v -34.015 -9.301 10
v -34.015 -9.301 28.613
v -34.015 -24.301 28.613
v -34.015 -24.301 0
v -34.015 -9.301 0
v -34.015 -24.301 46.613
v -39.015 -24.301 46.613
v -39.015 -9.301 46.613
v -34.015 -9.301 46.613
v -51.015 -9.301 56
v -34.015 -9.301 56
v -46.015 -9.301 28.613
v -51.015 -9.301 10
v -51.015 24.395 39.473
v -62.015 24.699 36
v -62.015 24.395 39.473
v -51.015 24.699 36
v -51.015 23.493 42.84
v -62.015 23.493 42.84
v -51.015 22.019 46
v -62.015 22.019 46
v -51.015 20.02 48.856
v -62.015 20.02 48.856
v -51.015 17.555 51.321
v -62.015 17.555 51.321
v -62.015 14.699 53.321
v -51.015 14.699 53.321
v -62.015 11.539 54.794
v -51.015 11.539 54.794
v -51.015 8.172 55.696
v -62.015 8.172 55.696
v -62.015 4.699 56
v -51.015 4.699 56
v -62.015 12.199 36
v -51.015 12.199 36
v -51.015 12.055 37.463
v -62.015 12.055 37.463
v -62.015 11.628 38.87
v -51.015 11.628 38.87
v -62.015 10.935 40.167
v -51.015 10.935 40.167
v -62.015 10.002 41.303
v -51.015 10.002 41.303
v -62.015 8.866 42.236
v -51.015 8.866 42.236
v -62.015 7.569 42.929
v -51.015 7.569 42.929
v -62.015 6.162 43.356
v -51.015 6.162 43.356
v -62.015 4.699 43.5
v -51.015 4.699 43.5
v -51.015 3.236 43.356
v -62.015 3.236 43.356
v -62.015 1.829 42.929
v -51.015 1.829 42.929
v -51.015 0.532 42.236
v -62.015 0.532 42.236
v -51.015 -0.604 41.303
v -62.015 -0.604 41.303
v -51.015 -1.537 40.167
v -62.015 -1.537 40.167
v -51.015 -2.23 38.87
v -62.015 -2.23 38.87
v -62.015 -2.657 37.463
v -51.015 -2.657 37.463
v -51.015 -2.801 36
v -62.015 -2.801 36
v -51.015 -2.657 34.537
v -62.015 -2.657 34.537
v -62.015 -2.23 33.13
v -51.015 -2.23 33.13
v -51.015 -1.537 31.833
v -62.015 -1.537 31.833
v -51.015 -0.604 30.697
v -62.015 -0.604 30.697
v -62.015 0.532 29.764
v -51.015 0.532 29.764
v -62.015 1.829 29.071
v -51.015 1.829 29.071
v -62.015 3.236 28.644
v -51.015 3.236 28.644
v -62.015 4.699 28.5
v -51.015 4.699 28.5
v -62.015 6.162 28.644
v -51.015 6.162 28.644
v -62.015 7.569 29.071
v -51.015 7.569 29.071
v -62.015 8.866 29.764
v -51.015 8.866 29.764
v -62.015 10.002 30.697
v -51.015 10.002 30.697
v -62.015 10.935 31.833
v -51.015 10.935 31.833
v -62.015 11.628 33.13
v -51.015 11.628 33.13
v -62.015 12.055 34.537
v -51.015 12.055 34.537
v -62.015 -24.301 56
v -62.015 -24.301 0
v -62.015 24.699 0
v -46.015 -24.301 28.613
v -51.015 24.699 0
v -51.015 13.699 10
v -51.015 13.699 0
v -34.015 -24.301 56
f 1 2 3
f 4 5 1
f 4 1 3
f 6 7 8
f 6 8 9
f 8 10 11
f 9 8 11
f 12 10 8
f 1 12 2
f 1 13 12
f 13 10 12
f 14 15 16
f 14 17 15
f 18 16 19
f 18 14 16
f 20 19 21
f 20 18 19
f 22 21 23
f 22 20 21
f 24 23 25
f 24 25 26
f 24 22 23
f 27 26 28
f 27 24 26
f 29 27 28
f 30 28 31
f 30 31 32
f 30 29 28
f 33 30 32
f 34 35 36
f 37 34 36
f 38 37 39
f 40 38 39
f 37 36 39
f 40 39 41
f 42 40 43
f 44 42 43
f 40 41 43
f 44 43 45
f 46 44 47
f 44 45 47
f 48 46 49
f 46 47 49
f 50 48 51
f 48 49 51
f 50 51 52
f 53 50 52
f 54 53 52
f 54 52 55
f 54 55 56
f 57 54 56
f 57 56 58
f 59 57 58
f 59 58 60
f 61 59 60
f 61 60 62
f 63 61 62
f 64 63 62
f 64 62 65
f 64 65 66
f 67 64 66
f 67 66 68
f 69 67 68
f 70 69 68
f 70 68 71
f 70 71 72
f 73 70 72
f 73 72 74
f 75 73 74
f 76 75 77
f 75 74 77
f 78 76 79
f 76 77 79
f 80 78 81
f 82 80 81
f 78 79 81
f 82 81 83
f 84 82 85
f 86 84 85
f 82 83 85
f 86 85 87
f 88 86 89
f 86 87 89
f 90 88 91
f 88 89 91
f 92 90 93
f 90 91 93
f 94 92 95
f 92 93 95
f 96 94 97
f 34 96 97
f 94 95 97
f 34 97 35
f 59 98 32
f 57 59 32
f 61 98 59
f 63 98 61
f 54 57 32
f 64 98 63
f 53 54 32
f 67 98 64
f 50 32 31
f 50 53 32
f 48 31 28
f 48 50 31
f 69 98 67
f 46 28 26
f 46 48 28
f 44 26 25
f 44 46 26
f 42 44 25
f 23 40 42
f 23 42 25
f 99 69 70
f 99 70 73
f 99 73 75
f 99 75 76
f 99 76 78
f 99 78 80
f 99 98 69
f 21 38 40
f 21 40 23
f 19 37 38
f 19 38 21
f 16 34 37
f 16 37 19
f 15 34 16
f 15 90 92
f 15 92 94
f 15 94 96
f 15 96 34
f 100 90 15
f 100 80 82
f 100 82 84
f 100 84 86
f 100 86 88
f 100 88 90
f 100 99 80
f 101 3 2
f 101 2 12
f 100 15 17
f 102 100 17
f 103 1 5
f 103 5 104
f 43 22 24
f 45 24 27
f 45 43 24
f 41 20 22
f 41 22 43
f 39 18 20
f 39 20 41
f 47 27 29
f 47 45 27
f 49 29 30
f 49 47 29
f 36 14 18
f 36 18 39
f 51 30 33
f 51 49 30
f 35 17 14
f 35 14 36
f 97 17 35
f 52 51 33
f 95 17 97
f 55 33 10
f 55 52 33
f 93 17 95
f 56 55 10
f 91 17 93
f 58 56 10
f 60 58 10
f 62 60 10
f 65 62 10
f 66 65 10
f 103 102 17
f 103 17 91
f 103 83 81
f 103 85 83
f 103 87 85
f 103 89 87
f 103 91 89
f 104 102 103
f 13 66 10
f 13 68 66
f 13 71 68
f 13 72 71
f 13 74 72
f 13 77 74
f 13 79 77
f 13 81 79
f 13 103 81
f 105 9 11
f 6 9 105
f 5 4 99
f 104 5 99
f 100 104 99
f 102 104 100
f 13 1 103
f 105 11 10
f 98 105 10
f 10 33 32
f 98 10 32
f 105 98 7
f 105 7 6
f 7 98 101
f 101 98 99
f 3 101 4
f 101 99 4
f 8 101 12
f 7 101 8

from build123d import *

# Parameters (mm, degrees)
Y_KSEKLIK_EKSTR_ZYON1_DEPTH = 56
RADYUS1_R                   = 20
KES_EKSTR_ZYON1_REACH       = 65.522
IZIM2_R                     = 7.5
KES_EKSTR_ZYON2_DEPTH       = 91.210054598
KES_EKSTR_ZYON2_DEPTH_BACK  = 91.210054598
FEDER1_REACH                = 89.131
IZIM4_WALL_W                = 204.86364479
IZIM4_WALL_H                = 10


with BuildPart() as part:
    # Çizim1 → Yükseklik-Ekstrüzyon1 (new body)
    with BuildSketch(Plane.XY):
        Polygon((-62.014949412, 24.698979592), (-51.014949412, 24.698979592), (-51.014949412, -9.301020408), (-34.014949412, -9.301020408), (-34.014949412, -24.301020408), (-51.014949412, -24.301020408), (-62.014949412, -24.301020408), align=None)
    extrude(amount=Y_KSEKLIK_EKSTR_ZYON1_DEPTH)

    # Radyus1
    radyus1_edges = [part.edges().sort_by_distance(p)[0] for p in [
        (-56.514949412, 24.698979592, 56),
    ]]
    fillet(radyus1_edges, radius=RADYUS1_R)

    # Çizim2 → Kes-Ekstrüzyon1 (cut, up to next)
    with BuildSketch(Plane(origin=(-51.014949412, 0, 0), x_dir=(0, 0, -1), z_dir=(1, 0, 0)), mode=Mode.PRIVATE) as kes_ekstr_zyon1_sk1:
        with Locations(Location((-36, 4.698979592, 0), (0, 0, 90))):
            Circle(IZIM2_R)
    kes_ekstr_zyon1_tool1 = extrude(kes_ekstr_zyon1_sk1.sketch, amount=-KES_EKSTR_ZYON1_REACH, mode=Mode.PRIVATE) & part.part
    add(kes_ekstr_zyon1_tool1.solids().sort_by_distance((-51.014949, 4.69898, 36))[0], mode=Mode.SUBTRACT)

    # Çizim3 → Kes-Ekstrüzyon2 (cut, two sides: drawn at the far end of the back side and taken through both)
    with BuildSketch(Plane(origin=(0, -9.301020408, 0), x_dir=(1, 0, 0), z_dir=(0, 1, 0)).offset(-KES_EKSTR_ZYON2_DEPTH_BACK)):
        Polygon((84.737919905, -28.613266847), (-34.014949412, -28.613266847), (-46.014949412, -28.613266847), (-39.014949412, -46.613266847), (-34.014949412, -46.613266847), (84.737919905, -46.613266847), (322.24365854, -46.613266847), (322.24365854, -28.613266847), align=None)
    extrude(amount=KES_EKSTR_ZYON2_DEPTH + KES_EKSTR_ZYON2_DEPTH_BACK, mode=Mode.SUBTRACT)

    # Çizim4 wall → Feder1 (add, up to next)
    with BuildSketch(Plane(origin=(-42.514949412, 2.198979592, 0), x_dir=(-0.594391061084, 0.804176141466, 0), z_dir=(0.804176141466, 0.594391061084, 0)), mode=Mode.PRIVATE) as feder1_sk1:
        with Locations((0, 5)):
            Rectangle(IZIM4_WALL_W, IZIM4_WALL_H)
    feder1_tool1 = extrude(feder1_sk1.sketch, amount=-FEDER1_REACH, mode=Mode.PRIVATE) - part.part
    add(feder1_tool1.solids().sort_by_distance((-42.514949412, 2.198979592, 0))[0])


solid = part.part
